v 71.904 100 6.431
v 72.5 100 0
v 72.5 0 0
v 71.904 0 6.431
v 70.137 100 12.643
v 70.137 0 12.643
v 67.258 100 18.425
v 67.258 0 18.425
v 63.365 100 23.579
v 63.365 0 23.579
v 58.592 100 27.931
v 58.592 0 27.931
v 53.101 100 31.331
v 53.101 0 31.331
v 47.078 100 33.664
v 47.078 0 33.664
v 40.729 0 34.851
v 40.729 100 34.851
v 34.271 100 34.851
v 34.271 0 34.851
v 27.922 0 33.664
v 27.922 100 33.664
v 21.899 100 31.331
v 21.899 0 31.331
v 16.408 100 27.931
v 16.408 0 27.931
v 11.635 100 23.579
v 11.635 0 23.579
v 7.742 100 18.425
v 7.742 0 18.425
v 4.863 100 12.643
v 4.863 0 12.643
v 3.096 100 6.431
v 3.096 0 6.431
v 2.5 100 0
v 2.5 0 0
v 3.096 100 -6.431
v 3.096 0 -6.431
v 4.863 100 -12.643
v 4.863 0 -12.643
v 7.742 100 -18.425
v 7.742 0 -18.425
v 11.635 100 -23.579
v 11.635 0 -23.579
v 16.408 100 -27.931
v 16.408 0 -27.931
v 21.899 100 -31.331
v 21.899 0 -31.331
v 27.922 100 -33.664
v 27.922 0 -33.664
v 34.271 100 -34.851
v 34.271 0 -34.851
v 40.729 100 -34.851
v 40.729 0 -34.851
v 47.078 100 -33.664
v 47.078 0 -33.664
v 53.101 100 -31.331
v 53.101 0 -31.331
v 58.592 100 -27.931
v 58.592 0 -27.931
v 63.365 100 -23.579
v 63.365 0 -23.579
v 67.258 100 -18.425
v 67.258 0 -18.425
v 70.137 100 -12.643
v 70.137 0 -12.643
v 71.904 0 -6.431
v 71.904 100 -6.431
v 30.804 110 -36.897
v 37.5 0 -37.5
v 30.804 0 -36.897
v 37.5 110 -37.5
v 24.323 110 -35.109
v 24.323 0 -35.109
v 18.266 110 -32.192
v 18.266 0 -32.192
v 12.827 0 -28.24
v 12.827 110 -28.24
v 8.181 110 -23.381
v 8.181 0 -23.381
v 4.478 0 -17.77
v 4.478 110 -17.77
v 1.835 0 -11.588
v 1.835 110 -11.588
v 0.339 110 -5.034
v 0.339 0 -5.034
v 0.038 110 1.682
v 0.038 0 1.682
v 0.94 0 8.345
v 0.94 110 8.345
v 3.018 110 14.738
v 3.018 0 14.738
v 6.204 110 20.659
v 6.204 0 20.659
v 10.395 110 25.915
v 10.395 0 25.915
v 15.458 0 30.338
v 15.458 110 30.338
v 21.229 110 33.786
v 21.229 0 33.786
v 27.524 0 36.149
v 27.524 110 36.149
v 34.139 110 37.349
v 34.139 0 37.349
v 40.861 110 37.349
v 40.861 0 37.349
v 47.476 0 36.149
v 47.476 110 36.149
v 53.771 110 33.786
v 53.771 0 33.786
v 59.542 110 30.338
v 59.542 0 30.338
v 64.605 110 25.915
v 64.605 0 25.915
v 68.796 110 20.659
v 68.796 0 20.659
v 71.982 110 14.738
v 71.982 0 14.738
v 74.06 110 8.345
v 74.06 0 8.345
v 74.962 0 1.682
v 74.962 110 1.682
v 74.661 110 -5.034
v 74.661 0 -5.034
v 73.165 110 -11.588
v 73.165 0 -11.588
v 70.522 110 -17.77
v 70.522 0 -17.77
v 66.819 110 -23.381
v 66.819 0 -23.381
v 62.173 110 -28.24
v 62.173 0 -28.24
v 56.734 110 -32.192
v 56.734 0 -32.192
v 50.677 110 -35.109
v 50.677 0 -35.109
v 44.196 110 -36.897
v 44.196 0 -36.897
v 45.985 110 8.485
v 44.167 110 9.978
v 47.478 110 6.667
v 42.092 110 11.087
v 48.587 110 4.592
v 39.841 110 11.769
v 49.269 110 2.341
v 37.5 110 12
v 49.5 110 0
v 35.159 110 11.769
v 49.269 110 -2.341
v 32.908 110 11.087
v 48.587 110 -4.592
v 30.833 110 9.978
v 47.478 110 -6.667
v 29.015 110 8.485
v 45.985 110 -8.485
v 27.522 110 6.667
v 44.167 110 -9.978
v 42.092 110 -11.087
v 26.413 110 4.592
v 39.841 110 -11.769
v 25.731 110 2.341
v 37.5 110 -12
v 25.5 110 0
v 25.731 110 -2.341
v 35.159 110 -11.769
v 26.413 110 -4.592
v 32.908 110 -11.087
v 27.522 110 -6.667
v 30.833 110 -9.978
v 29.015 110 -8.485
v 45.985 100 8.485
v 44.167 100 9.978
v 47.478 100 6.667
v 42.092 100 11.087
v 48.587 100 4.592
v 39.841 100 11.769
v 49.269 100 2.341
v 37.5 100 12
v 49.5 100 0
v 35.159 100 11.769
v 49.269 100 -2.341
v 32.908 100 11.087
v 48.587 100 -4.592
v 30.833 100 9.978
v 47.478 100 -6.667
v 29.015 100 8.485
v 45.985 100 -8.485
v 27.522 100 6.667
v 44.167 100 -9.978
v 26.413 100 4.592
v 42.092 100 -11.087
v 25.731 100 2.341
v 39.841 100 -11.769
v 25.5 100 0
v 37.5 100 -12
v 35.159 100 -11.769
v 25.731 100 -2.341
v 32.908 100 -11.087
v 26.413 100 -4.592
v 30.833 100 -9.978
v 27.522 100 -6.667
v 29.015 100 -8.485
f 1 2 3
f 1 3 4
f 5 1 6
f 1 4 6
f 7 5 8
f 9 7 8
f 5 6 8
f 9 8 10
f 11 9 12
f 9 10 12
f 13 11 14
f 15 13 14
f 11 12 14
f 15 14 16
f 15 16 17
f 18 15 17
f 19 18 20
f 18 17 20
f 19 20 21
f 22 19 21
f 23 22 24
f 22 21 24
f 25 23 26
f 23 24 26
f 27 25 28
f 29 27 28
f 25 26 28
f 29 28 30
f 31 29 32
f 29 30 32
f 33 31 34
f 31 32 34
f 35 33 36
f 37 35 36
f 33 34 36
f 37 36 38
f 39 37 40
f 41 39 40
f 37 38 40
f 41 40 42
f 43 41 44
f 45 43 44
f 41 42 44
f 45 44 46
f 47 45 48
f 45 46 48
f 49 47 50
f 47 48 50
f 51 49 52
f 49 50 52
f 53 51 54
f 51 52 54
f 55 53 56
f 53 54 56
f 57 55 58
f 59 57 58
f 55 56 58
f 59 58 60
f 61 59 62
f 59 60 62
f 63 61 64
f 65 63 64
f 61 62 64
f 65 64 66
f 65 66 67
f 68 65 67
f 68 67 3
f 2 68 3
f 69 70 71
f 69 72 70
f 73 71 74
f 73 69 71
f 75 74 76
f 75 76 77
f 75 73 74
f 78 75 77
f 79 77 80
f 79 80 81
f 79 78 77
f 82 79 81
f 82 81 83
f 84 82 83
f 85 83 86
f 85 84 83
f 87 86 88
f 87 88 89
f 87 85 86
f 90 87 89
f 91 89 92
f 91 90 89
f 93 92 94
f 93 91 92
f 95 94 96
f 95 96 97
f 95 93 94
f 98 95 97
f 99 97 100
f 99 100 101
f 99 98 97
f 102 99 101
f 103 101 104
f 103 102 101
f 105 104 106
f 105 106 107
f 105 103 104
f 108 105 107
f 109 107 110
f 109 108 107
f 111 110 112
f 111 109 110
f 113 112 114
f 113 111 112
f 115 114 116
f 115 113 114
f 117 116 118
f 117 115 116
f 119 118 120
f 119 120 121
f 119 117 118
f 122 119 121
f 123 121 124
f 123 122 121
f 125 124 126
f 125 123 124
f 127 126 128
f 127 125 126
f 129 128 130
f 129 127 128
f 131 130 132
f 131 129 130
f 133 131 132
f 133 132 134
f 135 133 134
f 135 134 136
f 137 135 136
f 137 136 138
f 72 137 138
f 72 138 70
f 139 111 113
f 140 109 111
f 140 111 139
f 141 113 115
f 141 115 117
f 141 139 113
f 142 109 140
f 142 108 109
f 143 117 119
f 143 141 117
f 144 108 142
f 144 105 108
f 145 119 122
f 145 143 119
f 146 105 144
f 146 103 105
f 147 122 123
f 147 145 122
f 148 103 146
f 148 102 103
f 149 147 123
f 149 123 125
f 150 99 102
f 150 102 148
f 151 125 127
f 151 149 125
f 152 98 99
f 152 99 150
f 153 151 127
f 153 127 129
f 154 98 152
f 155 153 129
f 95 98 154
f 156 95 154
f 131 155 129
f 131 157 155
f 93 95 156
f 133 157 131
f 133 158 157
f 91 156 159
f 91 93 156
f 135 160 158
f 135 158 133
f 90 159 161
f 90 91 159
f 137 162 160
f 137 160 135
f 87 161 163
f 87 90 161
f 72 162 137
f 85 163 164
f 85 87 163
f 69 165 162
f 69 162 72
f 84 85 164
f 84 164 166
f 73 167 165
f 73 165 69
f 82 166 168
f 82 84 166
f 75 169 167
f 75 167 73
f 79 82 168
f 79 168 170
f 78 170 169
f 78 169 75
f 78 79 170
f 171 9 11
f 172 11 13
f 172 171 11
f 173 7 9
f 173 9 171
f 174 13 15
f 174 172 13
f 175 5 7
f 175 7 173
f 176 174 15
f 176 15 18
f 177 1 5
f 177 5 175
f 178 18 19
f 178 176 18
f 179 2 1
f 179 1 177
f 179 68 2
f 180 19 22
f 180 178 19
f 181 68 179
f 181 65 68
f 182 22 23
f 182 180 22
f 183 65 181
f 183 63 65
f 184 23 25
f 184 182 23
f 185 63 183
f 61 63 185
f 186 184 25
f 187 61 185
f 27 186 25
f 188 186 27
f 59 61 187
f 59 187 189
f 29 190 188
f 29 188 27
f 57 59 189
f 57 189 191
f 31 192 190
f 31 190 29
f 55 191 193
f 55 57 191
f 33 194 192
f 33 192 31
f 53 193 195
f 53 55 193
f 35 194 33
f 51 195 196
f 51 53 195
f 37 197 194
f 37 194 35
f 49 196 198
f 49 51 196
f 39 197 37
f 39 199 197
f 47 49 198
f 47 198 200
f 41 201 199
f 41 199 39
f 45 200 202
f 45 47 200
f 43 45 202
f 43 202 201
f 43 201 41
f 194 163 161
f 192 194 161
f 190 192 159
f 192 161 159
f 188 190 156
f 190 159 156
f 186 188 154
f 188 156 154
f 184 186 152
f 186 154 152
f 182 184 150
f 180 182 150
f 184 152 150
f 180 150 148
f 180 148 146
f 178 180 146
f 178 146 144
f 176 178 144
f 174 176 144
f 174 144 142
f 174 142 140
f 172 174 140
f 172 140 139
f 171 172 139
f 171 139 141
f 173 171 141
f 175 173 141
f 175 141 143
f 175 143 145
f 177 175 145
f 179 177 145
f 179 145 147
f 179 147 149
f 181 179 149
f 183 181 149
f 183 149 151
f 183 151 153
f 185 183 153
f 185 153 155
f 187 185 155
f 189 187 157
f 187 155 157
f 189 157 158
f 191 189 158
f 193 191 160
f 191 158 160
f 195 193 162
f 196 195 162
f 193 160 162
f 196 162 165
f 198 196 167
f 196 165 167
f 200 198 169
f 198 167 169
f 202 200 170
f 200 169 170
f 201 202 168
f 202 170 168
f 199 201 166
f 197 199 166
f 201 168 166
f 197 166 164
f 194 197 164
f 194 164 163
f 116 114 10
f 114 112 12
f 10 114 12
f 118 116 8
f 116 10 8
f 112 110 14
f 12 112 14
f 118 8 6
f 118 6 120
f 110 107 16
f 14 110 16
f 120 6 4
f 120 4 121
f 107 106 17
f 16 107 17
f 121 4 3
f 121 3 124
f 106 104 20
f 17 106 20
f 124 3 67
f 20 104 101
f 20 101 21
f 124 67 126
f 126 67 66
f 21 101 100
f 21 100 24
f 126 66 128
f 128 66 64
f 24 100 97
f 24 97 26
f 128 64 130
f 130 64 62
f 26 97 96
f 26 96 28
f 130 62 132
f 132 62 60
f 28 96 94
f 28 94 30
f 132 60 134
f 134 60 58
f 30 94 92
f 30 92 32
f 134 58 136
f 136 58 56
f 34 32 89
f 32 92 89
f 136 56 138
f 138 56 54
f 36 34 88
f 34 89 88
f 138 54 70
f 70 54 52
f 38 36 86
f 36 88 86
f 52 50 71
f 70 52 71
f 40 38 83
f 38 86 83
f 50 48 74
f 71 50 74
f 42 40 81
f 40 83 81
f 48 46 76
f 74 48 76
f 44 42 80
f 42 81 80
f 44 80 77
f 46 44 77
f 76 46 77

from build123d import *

# Parameters (mm, degrees)
SKETCH1_W          = 37.5
SKETCH1_H          = 110
CUT_EXTRUDE2_DEPTH = 100
CUT_EXTRUDE3_DEPTH = 139.315761936


with BuildPart() as part:
    # Sketch1 → Revolve3 (revolve)
    with BuildSketch(Plane.XY, mode=Mode.PRIVATE) as revolve3_sk:
        with Locations((18.75, 55)):
            Rectangle(SKETCH1_W, SKETCH1_H)
    revolve(revolve3_sk.sketch.rotate(Axis((37.5, 0, 0), (0, 1, 0)), 270), axis=Axis((37.5, 0, 0), (0, 1, 0)))

    # Sketch2 → Cut-Extrude2 (cut)
    with BuildSketch(Plane(origin=(0, 0, 0), x_dir=(-1, 0, 0), z_dir=(0, -1, 0))):
        with BuildLine():
            ThreePointArc((-2.5, 0), (-37.5, 35), (-72.5, 0))
            Line((-72.5, 0), (-2.5, 0))
        make_face()
        with BuildLine():
            Line((-2.5, 0), (-72.5, 0))
            ThreePointArc((-72.5, 0), (-37.5, -35), (-2.5, 0))
        make_face()
    extrude(amount=-CUT_EXTRUDE2_DEPTH, mode=Mode.SUBTRACT)

    # Sketch3 → Cut-Extrude3 (cut, through all)
    with BuildSketch(Plane(origin=(0, 110, 0), x_dir=(1, 0, 0), z_dir=(0, 1, 0))):
        with BuildLine():
            ThreePointArc((49.5, 0), (37.5, 12), (25.5, 0))
            Line((25.5, 0), (49.5, 0))
        make_face()
        with BuildLine():
            Line((49.5, 0), (25.5, 0))
            ThreePointArc((25.5, 0), (37.5, -12), (49.5, 0))
        make_face()
    extrude(amount=-CUT_EXTRUDE3_DEPTH, mode=Mode.SUBTRACT)


solid = part.part
